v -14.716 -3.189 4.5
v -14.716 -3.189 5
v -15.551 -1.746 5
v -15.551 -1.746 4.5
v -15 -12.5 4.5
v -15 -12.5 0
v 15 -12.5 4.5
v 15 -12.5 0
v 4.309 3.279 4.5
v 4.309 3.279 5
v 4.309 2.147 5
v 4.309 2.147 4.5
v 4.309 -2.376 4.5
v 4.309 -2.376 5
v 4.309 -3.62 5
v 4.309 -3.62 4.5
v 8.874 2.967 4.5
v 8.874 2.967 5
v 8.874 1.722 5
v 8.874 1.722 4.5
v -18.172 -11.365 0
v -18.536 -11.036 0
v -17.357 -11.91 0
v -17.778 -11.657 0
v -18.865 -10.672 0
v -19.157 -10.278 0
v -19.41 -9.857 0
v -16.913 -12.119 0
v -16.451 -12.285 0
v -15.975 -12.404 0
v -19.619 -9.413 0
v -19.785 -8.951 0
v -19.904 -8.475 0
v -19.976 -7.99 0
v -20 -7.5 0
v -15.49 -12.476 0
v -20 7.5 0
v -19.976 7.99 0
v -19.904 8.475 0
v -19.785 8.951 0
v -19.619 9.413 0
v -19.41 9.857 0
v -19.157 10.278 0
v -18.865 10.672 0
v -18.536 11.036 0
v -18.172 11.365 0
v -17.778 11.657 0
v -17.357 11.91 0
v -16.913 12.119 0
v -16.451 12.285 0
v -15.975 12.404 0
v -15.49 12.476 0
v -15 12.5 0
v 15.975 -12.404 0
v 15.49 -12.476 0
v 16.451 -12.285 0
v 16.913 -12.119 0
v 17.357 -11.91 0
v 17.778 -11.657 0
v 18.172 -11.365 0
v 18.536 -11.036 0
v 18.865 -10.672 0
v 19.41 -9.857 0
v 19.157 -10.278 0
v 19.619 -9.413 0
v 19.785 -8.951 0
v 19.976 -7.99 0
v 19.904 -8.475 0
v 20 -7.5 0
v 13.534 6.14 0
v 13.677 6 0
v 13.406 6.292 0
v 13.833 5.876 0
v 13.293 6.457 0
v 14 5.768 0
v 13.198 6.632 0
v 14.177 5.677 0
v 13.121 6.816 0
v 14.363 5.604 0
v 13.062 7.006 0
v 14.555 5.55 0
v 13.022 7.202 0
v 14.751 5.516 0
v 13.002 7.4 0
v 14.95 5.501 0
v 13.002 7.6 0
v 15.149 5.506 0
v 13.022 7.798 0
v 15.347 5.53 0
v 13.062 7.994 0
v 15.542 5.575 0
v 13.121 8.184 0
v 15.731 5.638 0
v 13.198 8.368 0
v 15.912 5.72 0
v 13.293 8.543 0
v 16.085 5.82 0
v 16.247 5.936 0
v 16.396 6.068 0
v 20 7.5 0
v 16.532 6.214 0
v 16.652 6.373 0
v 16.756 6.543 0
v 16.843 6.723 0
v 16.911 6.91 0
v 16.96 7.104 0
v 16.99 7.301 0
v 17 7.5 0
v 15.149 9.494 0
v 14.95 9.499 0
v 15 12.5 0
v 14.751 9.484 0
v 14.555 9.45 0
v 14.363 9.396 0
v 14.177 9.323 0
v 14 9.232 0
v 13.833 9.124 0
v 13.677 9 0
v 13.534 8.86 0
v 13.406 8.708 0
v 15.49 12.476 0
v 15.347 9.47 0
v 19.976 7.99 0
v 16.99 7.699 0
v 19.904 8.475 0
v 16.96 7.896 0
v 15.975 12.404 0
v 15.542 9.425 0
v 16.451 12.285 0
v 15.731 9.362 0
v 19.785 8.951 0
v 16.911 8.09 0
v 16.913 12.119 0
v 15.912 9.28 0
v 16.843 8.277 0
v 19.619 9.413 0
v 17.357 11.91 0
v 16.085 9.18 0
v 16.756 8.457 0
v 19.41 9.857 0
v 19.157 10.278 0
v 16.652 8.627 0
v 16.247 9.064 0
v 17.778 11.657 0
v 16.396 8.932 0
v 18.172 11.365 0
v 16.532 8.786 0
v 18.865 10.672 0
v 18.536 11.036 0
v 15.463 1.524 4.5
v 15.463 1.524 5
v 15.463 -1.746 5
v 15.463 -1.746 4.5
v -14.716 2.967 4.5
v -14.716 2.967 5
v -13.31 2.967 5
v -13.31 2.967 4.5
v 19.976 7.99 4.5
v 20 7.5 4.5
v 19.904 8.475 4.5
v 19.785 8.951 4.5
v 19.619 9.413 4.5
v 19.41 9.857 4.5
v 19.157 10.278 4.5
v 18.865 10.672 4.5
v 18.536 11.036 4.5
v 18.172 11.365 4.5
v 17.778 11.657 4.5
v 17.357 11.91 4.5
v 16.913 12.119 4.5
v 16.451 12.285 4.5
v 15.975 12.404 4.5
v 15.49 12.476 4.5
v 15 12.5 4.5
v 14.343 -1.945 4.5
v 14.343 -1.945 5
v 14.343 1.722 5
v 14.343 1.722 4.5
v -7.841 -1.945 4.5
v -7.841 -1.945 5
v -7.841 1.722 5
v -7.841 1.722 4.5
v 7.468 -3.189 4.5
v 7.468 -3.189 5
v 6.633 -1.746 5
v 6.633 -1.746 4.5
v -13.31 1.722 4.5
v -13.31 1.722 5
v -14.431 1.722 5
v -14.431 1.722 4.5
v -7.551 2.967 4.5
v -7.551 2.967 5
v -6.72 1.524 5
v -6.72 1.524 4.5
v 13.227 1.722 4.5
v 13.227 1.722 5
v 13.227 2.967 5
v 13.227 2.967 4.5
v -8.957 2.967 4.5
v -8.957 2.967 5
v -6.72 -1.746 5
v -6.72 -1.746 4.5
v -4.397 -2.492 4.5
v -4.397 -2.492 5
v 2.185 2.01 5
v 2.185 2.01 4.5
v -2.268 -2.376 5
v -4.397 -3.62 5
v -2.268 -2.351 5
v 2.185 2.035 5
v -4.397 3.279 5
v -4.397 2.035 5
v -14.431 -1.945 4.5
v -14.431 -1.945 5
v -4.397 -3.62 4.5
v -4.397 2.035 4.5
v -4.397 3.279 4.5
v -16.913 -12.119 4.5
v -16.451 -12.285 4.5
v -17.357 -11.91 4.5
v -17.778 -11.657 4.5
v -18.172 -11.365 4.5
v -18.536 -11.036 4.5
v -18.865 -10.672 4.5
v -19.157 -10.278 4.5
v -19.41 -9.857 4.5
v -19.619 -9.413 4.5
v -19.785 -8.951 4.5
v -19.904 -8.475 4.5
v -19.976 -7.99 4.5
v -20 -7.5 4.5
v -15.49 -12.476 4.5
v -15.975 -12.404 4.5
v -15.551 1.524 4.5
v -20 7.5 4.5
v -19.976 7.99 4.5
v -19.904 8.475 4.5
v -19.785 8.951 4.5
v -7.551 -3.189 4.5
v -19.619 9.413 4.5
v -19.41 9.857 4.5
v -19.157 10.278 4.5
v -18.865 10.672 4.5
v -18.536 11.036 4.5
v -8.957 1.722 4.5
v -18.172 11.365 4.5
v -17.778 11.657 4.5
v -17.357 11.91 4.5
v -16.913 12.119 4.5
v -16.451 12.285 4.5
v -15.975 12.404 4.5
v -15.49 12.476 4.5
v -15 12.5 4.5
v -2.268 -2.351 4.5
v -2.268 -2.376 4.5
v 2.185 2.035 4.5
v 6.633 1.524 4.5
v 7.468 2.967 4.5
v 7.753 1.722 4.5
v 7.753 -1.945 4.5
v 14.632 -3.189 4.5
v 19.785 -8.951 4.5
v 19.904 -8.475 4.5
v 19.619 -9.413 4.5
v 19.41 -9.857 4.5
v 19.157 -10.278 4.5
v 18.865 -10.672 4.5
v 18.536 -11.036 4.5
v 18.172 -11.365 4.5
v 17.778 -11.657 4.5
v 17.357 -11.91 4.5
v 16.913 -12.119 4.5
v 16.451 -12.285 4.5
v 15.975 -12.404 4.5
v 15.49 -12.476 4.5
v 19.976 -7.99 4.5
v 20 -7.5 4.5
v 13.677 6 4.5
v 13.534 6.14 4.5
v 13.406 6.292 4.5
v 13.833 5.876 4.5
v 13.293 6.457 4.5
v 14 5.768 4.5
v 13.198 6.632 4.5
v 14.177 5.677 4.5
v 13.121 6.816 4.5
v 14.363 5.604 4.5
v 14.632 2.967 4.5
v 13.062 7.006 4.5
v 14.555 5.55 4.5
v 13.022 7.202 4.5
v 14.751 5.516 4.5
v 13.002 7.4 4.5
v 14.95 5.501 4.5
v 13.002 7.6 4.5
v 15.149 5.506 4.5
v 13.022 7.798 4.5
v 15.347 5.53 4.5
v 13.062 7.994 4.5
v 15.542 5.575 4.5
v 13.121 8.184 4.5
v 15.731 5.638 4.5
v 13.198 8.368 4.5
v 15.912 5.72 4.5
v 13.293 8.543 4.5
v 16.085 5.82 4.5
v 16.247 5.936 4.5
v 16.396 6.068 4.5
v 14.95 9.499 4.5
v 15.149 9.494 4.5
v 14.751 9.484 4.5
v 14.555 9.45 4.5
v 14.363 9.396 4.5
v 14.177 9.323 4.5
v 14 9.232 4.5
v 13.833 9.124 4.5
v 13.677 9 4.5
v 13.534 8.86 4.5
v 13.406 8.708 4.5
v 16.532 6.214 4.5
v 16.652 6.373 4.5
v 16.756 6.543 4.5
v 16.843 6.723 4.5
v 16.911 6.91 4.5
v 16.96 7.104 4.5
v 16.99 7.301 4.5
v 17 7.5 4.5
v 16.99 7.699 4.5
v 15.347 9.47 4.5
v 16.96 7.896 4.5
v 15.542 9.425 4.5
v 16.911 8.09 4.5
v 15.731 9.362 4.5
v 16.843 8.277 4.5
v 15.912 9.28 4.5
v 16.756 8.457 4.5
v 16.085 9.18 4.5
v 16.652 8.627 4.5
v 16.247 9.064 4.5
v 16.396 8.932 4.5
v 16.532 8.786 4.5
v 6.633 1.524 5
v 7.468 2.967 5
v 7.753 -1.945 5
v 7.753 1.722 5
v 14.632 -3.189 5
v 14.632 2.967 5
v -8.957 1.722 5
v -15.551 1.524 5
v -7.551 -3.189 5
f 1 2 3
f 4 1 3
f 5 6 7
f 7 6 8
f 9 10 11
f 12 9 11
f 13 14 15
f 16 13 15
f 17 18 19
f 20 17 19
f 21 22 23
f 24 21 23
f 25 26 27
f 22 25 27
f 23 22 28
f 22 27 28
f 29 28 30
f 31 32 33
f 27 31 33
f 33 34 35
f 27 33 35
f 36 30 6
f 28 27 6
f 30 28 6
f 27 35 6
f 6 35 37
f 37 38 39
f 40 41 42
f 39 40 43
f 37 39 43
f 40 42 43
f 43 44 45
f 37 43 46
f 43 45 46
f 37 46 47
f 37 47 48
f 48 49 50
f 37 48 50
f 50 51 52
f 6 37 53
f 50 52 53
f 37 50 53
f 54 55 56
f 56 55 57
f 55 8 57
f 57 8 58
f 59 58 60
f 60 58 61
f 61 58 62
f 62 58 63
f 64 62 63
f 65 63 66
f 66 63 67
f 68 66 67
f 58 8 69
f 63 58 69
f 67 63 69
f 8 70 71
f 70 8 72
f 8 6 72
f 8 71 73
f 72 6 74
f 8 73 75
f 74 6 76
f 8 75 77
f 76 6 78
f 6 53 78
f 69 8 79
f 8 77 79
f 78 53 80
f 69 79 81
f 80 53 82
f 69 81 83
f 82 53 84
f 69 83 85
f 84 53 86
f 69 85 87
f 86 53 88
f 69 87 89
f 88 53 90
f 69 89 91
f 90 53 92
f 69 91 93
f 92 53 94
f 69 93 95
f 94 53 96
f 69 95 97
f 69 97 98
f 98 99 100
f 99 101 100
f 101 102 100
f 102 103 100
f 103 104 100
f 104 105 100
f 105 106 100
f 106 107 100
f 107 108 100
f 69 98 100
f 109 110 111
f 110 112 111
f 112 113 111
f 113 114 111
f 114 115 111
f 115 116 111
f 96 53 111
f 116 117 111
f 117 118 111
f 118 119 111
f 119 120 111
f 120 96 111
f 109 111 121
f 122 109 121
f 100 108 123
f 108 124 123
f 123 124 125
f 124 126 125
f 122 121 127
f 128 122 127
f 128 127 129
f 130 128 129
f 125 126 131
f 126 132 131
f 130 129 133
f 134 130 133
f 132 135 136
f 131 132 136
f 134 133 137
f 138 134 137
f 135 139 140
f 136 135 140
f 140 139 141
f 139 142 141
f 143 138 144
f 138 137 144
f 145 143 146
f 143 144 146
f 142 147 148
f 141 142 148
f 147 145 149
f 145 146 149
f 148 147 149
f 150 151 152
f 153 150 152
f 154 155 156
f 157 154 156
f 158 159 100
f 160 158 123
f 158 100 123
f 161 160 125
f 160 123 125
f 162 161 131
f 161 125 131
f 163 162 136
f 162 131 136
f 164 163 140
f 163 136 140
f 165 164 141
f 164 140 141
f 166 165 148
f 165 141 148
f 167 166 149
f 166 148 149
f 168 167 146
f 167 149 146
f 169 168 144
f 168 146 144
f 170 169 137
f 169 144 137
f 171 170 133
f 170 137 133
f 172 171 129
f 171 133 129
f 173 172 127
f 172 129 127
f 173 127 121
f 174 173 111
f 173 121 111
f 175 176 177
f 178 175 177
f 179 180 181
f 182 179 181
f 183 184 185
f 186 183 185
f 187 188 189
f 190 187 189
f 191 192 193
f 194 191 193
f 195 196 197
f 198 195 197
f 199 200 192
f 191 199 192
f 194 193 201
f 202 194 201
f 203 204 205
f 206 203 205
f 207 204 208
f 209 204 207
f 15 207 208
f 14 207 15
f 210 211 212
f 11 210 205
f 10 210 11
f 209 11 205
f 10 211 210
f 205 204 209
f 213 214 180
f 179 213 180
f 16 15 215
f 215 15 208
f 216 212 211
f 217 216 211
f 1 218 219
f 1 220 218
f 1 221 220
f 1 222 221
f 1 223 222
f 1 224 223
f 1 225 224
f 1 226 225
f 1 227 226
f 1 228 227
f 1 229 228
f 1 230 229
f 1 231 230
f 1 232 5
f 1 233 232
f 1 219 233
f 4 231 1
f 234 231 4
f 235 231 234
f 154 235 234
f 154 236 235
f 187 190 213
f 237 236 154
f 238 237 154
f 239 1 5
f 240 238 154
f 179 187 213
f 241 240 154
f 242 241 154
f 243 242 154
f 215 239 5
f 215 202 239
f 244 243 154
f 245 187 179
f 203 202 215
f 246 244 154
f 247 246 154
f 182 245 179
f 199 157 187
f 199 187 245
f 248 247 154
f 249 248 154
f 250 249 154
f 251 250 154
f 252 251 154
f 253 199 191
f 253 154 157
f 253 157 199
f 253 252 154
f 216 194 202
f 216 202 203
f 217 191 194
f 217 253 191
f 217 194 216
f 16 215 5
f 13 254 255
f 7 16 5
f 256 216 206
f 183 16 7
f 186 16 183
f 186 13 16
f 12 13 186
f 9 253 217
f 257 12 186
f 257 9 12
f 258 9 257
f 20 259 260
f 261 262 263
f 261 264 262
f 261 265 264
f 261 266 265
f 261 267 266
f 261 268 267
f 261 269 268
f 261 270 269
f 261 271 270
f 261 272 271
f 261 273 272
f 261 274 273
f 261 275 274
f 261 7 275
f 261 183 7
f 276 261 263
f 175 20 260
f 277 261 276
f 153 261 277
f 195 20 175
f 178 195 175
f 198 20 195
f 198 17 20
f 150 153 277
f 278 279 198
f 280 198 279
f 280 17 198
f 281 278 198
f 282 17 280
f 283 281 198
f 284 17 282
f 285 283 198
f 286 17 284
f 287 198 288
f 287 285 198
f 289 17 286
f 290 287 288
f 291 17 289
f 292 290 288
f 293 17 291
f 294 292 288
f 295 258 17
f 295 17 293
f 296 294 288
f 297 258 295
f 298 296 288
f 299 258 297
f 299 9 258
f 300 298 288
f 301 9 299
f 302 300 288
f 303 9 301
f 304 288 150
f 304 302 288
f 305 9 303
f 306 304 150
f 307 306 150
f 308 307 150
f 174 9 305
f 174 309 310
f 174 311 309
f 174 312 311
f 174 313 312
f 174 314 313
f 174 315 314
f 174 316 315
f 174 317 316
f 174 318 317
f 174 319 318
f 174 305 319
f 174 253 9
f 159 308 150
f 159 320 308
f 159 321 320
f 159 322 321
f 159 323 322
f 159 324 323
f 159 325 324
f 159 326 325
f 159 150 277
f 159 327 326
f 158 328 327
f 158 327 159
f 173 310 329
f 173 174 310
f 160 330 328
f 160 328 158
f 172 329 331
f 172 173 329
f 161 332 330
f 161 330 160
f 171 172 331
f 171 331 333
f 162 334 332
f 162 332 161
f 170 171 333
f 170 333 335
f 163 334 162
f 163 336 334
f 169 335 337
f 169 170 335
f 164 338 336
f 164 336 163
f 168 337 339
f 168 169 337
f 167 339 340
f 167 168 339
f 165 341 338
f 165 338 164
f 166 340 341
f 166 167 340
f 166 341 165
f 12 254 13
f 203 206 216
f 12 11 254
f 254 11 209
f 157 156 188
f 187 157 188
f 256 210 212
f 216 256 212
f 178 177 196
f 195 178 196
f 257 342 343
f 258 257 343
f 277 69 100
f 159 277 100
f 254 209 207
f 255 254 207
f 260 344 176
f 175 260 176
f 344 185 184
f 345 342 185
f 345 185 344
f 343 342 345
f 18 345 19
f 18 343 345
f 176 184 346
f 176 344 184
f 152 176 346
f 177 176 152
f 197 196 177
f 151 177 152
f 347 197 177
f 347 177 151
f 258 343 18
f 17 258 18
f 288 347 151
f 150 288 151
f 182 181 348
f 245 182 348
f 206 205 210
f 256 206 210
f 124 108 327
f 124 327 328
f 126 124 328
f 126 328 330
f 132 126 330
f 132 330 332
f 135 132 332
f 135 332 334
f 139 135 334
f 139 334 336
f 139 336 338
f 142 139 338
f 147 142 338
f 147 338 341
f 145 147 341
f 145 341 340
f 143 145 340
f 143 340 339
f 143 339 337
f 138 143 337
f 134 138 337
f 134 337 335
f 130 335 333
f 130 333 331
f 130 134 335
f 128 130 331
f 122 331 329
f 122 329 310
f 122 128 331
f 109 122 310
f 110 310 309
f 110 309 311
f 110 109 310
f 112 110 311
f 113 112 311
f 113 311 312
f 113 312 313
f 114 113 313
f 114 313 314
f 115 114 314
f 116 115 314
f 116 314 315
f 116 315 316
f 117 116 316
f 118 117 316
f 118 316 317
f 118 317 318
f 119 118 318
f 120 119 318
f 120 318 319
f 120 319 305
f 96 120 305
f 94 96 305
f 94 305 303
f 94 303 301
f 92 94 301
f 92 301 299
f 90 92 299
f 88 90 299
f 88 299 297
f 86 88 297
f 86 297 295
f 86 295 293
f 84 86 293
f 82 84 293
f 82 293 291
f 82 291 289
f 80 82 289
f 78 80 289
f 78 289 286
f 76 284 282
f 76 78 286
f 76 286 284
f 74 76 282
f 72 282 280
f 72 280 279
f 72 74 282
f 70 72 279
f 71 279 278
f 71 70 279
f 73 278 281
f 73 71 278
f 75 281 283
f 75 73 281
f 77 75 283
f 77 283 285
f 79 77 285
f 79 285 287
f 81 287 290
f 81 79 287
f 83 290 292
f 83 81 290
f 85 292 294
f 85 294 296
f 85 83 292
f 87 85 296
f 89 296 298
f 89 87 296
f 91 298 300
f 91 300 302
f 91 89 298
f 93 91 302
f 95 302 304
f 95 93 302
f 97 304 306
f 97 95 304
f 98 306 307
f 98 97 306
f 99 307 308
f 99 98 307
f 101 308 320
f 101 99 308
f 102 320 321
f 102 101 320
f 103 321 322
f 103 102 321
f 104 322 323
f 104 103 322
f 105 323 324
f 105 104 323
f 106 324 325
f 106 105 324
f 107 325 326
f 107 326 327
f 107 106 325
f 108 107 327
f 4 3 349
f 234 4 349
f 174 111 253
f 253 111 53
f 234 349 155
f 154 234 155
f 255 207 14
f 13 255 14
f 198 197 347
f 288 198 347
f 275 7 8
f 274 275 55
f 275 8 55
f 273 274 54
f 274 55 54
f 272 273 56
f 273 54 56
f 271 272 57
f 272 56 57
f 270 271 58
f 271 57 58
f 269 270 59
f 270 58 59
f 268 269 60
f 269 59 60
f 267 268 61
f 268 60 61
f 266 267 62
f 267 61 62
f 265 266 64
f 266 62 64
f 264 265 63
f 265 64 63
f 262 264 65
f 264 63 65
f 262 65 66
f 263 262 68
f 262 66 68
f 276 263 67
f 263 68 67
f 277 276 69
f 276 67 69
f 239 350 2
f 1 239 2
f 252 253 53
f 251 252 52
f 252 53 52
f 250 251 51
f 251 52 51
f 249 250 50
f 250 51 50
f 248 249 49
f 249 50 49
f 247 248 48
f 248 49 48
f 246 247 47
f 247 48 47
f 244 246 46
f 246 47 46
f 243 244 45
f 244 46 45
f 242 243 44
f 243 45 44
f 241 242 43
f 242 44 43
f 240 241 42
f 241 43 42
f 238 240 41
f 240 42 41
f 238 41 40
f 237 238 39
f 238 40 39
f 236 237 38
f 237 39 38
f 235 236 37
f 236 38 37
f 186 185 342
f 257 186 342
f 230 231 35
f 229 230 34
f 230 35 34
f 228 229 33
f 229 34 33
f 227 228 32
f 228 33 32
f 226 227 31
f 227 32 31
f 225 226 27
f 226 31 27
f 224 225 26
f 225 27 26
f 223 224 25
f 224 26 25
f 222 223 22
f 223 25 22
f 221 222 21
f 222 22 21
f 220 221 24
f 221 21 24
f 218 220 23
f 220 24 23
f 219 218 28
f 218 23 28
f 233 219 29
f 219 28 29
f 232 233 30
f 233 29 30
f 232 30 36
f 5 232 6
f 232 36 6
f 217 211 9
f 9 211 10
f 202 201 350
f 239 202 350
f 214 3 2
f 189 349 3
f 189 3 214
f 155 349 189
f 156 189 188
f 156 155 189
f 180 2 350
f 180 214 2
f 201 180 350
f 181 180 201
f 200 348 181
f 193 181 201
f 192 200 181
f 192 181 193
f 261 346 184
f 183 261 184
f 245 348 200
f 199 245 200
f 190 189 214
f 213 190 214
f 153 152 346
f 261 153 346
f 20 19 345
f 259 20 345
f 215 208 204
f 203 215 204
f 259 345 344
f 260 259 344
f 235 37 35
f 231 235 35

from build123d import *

# Parameters (mm, degrees)
F0_R     = 2
F1_DEPTH = 5
F2_W     = 42.5312
F2_H     = 26.740546
F2_R     = 2
F3_DEPTH = 0.5


with BuildPart() as f1:
    # F0 (on Top) → F1 (new body)
    with BuildSketch(Plane.XY):
        with BuildLine():
            Line((15, 12.5), (-15, 12.5))
            ThreePointArc((-15, 12.5), (-18.535534, 11.035534), (-20, 7.5))
            Line((-20, 7.5), (-20, -7.5))
            ThreePointArc((-20, -7.5), (-18.535534, -11.035534), (-15, -12.5))
            Line((-15, -12.5), (15, -12.5))
            ThreePointArc((15, -12.5), (18.535534, -11.035534), (20, -7.5))
            Line((20, -7.5), (20, 7.5))
            ThreePointArc((20, 7.5), (18.535534, 11.035534), (15, 12.5))
        make_face()
        with Locations((15, 7.5)):
            Circle(F0_R, mode=Mode.SUBTRACT)
    extrude(amount=F1_DEPTH)

    # F2 (on face) → F3 (cut)
    with BuildSketch(Plane.XY.offset(5)):
        Rectangle(F2_W, F2_H)
        with BuildLine():
            Line((-15, 12.5), (15, 12.5))
            ThreePointArc((15, 12.5), (18.535534, 11.035534), (20, 7.5))
            Line((20, 7.5), (20, -7.5))
            ThreePointArc((20, -7.5), (18.535534, -11.035534), (15, -12.5))
            Line((15, -12.5), (-15, -12.5))
            ThreePointArc((-15, -12.5), (-18.535534, -11.035534), (-20, -7.5))
            Line((-20, -7.5), (-20, 7.5))
            ThreePointArc((-20, 7.5), (-18.535534, 11.035534), (-15, 12.5))
        make_face(mode=Mode.SUBTRACT)
        with Locations((15, 7.5)):
            Circle(F2_R)
        with BuildLine():
            ThreePointArc((20, 7.5), (18.535534, 11.035534), (15, 12.5))
            Line((15, 12.5), (-15, 12.5))
            ThreePointArc((-15, 12.5), (-18.535534, 11.035534), (-20, 7.5))
            Line((-20, 7.5), (-20, -7.5))
            ThreePointArc((-20, -7.5), (-18.535534, -11.035534), (-15, -12.5))
            Line((-15, -12.5), (15, -12.5))
            ThreePointArc((15, -12.5), (18.535534, -11.035534), (20, -7.5))
            Line((20, -7.5), (20, 7.5))
        make_face()
        Polygon((-7.840759, 1.722246), (-8.956835, 1.722246), (-8.956835, 2.966643), (-7.551199, 2.966643), (-6.720365, 1.523822), (-6.720365, -1.746251), (-7.551199, -3.189047), (-14.715777, -3.189047), (-15.550929, -1.746251), (-15.550929, 1.523822), (-14.715777, 2.966643), (-13.310141, 2.966643), (-13.310141, 1.722246), (-14.430535, 1.722246), (-14.430535, -1.944701), (-7.840759, -1.944701), align=None, mode=Mode.SUBTRACT)
        Polygon((-2.267872, -2.351202), (-2.267872, -2.376044), (4.309483, -2.376044), (4.309483, -3.62039), (-4.396925, -3.62039), (-4.396925, -2.491791), (2.18457, 2.010257), (2.18457, 2.035098), (-4.396925, 2.035098), (-4.396925, 3.279444), (4.309483, 3.279444), (4.309483, 2.146706), align=None, mode=Mode.SUBTRACT)
        Polygon((14.343017, 1.722246), (13.226788, 1.722246), (13.226788, 2.966643), (14.632399, 2.966643), (15.463335, 1.523822), (15.463335, -1.746251), (14.632399, -3.189047), (7.467973, -3.189047), (6.632872, -1.746251), (6.632872, 1.523822), (7.467973, 2.966643), (8.873559, 2.966643), (8.873559, 1.722246), (7.753241, 1.722246), (7.753241, -1.944701), (14.343017, -1.944701), align=None, mode=Mode.SUBTRACT)
        with Locations((15, 7.5)):
            Circle(F2_R, mode=Mode.SUBTRACT)
    extrude(amount=-F3_DEPTH, mode=Mode.SUBTRACT)


solid = f1.part
